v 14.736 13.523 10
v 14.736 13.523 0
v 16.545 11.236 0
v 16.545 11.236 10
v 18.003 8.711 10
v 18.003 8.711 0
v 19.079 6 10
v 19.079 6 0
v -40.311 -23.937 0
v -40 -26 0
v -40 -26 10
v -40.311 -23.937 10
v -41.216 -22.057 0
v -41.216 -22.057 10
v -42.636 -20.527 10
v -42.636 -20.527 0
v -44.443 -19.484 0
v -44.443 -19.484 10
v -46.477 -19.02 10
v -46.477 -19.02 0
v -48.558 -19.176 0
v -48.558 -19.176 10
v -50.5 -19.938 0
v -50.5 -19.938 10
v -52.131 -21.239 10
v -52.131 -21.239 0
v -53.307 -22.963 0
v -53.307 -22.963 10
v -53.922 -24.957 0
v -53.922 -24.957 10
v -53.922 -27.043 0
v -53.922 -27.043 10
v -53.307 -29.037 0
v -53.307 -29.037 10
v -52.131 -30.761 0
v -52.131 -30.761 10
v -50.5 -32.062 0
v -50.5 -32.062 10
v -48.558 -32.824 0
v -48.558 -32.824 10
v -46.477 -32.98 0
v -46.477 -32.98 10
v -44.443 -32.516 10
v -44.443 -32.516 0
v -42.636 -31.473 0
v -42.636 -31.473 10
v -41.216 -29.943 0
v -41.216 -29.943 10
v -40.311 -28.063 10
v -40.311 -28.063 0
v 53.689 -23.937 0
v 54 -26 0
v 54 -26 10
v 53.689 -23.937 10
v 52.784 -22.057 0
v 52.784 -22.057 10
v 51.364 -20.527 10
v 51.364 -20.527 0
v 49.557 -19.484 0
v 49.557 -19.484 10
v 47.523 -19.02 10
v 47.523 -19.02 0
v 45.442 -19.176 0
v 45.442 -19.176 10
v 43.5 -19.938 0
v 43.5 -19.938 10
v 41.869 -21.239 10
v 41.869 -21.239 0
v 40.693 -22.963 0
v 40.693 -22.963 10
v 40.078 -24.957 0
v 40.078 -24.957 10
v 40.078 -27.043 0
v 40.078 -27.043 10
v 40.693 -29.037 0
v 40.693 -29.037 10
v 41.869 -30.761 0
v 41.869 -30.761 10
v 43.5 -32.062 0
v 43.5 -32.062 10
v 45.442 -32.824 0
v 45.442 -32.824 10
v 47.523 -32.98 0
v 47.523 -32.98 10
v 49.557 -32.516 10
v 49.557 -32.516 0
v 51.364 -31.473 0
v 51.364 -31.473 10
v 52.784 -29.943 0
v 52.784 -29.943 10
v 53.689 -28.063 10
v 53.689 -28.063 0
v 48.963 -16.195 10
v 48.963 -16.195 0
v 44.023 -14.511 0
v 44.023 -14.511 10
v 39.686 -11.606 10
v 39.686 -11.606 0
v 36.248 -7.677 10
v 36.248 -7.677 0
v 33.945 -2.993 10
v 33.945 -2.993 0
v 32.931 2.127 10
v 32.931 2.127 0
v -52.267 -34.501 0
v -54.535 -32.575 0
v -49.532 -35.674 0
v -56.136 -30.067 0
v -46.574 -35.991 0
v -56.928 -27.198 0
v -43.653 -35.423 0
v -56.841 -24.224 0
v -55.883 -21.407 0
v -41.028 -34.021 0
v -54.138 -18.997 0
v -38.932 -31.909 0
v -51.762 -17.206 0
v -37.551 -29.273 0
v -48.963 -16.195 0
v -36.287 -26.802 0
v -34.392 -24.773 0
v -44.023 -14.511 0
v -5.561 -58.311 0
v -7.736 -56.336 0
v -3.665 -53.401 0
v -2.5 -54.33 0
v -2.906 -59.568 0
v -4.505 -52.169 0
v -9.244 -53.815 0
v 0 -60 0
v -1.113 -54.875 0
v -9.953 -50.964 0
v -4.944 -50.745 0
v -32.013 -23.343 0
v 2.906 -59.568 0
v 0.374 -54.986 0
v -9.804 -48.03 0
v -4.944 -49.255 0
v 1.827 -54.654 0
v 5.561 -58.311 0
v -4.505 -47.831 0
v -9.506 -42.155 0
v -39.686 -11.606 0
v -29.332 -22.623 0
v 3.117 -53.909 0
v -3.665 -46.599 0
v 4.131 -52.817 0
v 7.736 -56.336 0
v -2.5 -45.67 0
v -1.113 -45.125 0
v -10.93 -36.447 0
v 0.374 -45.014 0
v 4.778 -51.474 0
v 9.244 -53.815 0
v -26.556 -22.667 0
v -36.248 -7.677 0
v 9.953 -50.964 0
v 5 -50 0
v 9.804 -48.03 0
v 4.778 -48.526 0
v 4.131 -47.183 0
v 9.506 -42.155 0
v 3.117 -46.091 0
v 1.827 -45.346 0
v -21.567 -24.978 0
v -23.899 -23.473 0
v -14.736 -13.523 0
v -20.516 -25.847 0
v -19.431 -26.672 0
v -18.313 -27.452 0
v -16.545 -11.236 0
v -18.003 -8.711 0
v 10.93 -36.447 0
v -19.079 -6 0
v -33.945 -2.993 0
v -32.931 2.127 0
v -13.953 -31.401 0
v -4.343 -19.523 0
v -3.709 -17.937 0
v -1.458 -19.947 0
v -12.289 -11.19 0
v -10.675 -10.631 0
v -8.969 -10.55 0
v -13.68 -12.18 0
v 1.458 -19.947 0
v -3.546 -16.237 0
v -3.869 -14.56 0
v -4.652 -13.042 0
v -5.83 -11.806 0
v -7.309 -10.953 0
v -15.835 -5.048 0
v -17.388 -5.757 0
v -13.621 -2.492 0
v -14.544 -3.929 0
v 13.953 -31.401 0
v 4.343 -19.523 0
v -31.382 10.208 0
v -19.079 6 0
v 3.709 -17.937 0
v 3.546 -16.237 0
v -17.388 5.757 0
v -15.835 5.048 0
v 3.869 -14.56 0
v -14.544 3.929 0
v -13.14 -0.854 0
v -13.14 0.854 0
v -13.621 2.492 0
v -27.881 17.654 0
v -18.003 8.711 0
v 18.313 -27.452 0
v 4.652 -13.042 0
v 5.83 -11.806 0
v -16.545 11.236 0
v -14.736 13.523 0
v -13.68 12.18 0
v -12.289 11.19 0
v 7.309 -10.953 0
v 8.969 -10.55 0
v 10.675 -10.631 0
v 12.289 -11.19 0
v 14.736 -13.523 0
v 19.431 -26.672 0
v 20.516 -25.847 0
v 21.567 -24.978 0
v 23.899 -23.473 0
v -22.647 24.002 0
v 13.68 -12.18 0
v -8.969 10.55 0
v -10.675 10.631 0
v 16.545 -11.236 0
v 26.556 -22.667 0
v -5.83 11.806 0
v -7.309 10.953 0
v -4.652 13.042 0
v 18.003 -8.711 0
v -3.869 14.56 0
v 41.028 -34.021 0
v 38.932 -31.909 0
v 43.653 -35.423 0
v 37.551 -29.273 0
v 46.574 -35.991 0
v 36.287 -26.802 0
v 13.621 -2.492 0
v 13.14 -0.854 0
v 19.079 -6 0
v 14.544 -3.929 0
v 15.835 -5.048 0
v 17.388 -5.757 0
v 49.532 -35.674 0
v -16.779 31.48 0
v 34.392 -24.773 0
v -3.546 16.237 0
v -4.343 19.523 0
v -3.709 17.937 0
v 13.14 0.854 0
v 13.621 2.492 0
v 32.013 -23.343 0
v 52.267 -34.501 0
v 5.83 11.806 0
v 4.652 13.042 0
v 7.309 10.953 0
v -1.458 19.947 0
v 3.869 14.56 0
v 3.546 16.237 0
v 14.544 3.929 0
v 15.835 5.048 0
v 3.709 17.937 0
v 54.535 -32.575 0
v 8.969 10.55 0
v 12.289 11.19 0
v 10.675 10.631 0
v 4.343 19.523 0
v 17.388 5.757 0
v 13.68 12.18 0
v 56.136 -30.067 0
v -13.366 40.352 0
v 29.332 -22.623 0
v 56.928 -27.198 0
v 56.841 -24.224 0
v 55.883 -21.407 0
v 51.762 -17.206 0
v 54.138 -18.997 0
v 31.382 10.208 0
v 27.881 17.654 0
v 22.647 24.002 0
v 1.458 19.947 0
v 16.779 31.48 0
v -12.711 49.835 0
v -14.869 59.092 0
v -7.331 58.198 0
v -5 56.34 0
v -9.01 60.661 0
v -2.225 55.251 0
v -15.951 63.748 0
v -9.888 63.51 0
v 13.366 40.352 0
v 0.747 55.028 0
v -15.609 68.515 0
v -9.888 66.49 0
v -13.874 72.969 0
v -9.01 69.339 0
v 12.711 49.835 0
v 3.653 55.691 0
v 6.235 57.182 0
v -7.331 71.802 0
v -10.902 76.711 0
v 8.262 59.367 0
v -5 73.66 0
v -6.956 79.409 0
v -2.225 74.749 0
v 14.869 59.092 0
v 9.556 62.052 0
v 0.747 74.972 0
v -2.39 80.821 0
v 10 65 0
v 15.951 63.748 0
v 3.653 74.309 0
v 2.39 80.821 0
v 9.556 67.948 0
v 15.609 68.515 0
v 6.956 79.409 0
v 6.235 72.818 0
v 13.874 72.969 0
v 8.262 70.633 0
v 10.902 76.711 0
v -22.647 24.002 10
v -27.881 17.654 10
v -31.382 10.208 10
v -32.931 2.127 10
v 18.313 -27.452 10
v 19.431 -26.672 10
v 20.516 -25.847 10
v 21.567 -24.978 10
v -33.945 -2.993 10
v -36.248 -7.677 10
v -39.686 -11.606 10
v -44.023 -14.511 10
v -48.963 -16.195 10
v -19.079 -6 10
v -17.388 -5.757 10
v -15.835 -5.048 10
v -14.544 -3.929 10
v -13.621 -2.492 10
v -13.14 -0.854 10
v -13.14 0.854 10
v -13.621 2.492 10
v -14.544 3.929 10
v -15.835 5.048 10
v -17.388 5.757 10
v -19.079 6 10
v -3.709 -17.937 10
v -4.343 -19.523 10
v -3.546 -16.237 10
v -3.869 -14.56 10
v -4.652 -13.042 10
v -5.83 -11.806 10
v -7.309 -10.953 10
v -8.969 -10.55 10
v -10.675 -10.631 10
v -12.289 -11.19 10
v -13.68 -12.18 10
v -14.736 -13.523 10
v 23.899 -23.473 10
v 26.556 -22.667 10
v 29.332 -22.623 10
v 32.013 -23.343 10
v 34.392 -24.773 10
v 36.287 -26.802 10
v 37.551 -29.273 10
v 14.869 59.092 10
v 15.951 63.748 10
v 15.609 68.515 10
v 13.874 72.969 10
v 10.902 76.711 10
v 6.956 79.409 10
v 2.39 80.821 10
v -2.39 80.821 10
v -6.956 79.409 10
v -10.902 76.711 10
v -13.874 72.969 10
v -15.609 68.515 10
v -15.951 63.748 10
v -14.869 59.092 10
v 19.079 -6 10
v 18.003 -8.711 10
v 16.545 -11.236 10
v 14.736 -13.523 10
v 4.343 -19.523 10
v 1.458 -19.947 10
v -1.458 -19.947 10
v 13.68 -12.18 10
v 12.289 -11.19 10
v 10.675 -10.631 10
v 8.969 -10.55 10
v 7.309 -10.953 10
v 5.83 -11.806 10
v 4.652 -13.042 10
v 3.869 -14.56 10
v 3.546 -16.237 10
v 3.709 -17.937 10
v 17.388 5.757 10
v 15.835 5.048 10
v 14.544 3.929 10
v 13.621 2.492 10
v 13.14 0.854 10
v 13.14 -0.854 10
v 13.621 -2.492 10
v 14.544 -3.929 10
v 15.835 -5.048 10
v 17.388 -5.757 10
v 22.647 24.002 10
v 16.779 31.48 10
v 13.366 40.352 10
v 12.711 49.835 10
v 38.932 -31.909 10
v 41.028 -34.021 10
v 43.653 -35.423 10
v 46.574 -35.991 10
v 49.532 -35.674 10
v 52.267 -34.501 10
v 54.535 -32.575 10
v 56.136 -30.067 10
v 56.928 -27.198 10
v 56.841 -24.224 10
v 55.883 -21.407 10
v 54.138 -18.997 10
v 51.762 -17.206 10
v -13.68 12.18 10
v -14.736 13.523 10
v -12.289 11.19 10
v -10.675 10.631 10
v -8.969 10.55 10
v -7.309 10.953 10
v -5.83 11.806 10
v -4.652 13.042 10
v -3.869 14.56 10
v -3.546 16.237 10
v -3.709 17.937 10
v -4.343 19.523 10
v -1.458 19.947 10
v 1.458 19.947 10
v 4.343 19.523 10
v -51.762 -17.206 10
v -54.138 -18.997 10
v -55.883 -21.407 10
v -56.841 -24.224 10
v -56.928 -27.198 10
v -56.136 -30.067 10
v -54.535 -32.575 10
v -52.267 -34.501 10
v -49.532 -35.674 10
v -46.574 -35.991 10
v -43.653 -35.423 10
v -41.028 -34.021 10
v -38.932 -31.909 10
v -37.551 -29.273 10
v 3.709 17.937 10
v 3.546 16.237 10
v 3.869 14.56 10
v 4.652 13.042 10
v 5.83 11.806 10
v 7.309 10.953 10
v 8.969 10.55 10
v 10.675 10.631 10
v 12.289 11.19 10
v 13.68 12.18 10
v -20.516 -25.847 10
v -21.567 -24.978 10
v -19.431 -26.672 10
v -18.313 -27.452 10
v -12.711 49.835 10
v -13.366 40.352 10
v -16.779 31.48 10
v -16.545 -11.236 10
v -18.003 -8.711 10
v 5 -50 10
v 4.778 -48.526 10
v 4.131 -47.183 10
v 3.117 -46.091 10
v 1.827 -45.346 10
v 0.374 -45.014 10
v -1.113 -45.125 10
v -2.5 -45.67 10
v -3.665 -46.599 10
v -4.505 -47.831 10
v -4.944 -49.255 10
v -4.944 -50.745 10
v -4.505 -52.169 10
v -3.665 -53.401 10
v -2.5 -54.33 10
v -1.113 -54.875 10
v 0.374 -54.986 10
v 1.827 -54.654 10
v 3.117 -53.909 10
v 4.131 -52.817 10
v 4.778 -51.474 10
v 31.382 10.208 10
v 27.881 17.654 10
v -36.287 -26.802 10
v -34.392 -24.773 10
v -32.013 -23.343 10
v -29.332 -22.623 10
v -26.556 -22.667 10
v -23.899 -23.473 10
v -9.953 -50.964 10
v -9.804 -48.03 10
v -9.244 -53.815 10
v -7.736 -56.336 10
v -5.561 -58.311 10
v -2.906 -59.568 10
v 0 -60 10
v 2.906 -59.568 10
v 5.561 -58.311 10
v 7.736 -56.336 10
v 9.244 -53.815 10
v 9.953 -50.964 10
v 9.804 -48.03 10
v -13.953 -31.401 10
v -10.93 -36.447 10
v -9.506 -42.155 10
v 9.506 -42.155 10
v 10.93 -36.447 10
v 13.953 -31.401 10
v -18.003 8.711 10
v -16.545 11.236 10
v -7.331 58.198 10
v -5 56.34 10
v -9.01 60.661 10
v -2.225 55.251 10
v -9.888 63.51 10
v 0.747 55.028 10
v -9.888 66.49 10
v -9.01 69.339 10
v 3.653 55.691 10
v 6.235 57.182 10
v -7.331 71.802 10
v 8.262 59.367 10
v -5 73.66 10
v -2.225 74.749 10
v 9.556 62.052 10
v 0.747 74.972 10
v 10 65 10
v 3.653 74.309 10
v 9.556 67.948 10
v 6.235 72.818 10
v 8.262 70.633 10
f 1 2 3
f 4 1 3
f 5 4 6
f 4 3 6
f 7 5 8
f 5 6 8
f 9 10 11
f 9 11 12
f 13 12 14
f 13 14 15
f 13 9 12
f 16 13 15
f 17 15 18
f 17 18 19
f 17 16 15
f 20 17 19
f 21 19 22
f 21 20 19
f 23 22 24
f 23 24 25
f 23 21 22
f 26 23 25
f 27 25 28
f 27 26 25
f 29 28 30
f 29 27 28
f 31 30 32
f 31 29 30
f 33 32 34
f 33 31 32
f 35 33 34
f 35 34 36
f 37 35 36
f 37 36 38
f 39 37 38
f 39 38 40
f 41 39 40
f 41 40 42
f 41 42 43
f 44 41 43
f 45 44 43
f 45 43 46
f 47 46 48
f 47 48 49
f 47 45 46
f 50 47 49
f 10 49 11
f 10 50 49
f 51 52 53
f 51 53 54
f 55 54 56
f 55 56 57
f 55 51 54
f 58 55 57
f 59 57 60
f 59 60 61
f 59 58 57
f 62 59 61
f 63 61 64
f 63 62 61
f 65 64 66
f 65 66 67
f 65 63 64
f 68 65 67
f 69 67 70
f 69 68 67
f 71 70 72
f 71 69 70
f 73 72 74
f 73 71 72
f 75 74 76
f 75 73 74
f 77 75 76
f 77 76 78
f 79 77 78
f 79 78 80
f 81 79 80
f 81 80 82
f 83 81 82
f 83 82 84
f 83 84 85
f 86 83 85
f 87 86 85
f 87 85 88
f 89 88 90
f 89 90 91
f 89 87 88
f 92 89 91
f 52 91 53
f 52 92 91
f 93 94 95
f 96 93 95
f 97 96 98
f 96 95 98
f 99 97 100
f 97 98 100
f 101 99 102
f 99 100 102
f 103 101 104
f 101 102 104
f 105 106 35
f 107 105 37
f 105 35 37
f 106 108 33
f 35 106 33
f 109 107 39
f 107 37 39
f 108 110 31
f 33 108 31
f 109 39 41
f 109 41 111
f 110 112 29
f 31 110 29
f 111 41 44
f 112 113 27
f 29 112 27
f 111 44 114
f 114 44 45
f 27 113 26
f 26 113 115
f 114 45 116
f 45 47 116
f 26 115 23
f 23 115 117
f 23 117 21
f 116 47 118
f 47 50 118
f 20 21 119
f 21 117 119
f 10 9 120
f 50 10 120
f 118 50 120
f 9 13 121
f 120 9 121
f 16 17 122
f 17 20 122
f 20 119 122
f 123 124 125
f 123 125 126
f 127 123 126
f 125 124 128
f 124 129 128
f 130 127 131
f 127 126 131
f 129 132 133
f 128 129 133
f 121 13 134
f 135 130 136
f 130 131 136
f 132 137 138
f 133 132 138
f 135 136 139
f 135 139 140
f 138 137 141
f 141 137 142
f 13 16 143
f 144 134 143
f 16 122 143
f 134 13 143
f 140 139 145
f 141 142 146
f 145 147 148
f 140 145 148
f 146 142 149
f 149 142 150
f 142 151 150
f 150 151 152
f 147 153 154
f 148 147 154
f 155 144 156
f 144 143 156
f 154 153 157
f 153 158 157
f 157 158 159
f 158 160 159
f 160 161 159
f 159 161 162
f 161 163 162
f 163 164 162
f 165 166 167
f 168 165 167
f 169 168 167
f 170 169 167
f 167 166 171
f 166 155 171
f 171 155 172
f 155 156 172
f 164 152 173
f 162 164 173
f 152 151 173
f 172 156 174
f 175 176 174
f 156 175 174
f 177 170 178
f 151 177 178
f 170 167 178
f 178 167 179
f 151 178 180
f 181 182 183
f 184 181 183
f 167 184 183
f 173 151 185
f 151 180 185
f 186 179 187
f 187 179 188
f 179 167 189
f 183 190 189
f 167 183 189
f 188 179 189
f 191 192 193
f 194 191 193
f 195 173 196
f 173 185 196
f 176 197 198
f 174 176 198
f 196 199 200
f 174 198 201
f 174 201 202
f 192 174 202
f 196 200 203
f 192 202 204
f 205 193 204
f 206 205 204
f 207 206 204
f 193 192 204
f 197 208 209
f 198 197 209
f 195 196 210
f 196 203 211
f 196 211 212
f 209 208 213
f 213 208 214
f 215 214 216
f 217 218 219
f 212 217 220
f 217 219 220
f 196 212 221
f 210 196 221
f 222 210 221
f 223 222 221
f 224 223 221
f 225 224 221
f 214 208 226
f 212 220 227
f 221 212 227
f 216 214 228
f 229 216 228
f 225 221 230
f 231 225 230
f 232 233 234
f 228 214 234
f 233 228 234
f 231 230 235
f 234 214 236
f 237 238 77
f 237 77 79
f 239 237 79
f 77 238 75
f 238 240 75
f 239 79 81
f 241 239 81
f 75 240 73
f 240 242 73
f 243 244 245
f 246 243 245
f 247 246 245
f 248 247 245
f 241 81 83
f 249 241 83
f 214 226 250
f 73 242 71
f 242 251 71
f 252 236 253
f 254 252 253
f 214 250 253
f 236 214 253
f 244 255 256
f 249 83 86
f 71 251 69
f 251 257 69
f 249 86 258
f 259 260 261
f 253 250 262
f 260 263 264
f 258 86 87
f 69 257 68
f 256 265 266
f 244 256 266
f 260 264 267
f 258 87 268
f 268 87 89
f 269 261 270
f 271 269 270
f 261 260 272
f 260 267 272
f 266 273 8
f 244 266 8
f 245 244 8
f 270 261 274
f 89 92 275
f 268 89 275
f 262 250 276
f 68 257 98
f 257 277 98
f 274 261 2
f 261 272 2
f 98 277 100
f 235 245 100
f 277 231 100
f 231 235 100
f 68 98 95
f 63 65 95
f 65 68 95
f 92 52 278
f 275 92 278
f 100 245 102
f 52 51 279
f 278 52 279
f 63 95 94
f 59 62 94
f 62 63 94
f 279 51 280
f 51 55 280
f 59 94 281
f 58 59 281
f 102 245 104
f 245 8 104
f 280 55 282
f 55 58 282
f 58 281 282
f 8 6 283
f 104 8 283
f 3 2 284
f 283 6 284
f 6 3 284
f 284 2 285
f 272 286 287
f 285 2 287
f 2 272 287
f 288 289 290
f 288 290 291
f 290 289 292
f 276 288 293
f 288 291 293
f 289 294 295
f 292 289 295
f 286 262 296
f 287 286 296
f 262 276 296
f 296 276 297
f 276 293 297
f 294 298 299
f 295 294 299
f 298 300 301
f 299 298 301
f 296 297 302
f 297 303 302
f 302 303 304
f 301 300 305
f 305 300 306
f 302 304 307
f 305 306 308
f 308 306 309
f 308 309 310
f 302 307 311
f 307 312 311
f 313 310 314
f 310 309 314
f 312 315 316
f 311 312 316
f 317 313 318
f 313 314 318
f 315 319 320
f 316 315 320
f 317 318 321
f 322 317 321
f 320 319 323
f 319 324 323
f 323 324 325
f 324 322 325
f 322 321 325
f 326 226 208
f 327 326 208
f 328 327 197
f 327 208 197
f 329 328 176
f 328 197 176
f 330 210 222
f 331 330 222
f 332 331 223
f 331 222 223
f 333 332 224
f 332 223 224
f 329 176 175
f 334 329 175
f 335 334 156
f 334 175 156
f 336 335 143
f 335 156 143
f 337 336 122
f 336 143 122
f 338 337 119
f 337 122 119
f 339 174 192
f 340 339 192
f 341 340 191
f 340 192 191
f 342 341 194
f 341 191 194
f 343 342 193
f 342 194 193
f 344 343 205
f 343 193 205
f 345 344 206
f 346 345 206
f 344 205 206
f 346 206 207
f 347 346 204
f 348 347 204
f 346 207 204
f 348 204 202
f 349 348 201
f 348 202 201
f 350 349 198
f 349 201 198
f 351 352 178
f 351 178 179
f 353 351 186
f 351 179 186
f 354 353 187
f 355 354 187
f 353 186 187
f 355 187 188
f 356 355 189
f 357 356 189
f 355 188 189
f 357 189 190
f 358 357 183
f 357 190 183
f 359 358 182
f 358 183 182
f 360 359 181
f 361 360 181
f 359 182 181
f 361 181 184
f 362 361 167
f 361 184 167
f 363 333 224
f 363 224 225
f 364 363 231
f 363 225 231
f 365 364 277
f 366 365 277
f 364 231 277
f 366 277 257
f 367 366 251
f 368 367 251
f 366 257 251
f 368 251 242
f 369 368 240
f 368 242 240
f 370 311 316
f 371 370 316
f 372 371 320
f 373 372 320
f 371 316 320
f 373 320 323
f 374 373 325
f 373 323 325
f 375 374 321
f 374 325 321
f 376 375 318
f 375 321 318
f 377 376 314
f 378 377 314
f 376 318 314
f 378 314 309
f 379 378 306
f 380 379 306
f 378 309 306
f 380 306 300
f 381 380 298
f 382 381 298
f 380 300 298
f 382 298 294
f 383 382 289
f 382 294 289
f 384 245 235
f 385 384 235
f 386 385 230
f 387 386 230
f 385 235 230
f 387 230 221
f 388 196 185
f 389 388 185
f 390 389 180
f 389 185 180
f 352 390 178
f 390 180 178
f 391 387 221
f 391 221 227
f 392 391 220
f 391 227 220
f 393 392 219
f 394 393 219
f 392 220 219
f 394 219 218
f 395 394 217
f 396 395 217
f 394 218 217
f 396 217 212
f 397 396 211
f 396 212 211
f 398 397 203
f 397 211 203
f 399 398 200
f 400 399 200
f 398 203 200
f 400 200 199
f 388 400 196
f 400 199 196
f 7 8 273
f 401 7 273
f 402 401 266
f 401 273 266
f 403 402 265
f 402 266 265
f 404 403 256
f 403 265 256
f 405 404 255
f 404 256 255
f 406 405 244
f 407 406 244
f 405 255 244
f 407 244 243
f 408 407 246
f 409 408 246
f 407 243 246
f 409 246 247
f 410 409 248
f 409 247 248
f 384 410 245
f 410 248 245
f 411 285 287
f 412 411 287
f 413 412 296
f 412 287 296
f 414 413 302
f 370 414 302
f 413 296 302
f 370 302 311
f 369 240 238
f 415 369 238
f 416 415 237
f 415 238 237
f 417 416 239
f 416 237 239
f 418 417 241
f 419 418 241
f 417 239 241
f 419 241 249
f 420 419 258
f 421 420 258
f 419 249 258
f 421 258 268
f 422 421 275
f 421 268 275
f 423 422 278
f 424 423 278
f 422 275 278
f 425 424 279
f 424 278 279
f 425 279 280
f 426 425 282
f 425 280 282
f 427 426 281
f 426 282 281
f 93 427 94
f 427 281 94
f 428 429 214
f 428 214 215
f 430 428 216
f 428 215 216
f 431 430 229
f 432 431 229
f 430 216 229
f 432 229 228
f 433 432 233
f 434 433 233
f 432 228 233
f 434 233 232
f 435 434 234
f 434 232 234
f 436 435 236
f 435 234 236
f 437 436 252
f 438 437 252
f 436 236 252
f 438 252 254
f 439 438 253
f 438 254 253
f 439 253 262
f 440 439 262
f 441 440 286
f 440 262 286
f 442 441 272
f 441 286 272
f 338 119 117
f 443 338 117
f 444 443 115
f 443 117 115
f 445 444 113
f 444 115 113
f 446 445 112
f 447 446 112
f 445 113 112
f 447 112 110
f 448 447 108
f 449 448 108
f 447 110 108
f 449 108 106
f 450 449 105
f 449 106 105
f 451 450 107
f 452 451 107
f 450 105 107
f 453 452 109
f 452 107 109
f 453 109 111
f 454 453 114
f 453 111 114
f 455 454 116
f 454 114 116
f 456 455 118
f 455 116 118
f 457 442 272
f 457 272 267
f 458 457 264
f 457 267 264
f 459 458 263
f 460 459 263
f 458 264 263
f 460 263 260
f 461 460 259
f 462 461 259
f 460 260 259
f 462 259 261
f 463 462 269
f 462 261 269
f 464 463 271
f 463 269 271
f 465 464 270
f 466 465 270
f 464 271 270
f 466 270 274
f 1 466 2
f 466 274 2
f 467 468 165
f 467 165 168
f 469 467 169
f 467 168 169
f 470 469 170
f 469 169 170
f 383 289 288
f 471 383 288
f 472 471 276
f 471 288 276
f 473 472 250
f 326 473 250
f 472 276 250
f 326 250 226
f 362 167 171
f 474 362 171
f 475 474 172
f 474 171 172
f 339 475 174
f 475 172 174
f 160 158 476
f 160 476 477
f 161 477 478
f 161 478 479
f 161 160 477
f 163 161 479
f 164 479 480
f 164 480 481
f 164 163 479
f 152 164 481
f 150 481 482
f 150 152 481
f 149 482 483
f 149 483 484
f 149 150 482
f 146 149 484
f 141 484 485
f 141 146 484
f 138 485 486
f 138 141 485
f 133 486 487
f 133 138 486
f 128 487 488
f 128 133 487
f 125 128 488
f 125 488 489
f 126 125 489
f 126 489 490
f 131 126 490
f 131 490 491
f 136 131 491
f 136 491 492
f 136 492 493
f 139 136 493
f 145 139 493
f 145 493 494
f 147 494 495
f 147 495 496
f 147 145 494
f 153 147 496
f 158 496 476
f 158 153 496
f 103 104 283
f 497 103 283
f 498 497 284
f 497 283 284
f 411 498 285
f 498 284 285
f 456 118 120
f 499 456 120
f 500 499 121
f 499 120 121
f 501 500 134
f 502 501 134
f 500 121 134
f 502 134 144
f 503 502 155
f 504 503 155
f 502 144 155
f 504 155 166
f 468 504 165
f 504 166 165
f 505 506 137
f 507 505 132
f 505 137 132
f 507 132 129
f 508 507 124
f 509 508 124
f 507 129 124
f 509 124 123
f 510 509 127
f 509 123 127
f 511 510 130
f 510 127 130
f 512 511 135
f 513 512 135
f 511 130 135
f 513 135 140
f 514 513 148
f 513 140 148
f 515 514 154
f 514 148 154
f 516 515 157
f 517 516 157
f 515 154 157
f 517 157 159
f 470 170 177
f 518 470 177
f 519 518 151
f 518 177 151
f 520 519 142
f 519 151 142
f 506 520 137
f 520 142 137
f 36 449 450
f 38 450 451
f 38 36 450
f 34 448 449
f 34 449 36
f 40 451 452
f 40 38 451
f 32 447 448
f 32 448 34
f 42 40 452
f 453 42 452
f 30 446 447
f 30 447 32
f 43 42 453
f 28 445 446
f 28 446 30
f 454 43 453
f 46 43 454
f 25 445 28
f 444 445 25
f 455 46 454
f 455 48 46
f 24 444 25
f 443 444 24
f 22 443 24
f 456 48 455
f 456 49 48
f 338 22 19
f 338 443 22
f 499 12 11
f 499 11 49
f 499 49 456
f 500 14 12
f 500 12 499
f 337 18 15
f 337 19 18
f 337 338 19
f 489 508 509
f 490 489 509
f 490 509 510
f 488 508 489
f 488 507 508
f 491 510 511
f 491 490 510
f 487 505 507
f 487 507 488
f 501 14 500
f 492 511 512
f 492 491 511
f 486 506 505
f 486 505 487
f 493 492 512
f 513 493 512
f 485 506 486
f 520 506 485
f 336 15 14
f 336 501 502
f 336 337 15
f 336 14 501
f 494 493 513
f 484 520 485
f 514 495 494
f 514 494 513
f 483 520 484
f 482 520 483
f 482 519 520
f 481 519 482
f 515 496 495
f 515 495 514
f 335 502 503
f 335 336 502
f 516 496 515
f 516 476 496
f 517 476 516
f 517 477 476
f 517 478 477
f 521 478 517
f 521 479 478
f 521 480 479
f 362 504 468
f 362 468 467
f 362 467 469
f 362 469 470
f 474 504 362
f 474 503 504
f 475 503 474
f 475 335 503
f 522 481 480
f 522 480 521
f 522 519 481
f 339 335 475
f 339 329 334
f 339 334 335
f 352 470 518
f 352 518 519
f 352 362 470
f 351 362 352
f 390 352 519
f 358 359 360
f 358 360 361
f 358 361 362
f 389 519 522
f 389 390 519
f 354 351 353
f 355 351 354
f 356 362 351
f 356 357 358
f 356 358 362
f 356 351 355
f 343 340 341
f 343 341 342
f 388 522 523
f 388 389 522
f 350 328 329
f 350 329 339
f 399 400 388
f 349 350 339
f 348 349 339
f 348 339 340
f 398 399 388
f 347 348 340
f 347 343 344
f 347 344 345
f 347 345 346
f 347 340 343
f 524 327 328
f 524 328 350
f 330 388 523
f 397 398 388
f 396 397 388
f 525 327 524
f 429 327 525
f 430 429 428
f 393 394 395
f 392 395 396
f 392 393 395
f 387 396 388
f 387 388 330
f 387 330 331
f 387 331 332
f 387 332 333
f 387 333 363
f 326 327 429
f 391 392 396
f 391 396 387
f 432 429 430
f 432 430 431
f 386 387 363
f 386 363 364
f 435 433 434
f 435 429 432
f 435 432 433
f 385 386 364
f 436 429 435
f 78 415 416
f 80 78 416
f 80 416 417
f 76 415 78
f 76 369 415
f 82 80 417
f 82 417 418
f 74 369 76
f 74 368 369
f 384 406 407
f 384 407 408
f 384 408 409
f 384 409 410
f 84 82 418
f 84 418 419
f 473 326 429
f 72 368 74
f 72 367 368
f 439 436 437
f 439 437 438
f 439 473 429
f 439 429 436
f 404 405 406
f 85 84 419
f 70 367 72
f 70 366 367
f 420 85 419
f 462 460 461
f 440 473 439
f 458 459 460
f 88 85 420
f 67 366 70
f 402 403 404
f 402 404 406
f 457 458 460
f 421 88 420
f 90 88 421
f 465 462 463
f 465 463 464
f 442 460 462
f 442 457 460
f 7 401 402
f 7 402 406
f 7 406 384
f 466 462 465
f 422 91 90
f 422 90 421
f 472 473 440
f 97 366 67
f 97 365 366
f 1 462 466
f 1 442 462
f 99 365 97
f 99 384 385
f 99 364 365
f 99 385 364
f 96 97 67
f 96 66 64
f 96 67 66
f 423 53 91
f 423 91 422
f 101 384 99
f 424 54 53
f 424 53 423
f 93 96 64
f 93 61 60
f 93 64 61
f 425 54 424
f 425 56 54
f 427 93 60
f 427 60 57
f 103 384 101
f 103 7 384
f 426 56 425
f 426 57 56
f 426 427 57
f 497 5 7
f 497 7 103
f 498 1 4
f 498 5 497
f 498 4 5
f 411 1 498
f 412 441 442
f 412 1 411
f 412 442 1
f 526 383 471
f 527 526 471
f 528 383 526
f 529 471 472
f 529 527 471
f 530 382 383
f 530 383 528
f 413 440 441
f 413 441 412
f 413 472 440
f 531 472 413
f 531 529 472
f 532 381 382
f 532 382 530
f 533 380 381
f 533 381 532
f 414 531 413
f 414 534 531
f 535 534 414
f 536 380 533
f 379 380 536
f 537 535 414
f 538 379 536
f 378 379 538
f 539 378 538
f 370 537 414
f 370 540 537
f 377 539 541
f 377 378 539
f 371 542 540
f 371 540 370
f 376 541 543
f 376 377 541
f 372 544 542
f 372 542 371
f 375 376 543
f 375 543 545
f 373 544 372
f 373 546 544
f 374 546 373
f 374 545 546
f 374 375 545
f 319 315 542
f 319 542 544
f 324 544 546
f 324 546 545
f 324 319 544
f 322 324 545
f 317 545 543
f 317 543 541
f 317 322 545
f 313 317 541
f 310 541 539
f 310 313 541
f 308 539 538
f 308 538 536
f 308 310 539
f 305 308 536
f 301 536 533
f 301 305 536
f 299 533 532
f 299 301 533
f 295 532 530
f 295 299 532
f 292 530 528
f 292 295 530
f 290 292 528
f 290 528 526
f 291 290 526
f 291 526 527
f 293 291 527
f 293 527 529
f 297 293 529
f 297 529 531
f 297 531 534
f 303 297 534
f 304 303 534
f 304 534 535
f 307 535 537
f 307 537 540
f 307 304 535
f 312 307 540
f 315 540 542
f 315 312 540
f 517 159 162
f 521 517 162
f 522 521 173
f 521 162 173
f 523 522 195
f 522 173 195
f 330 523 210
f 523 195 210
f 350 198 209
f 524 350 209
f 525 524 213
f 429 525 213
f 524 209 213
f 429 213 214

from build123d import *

# Parameters (mm, degrees)
SKETCH1_R           = 7
SKETCH1_R_2         = 5
SKETCH1_R_3         = 10
BOSS_EXTRUDE1_DEPTH = 10


with BuildPart() as part:
    # Sketch1 → Boss-Extrude1 (new body)
    with BuildSketch(Plane.XY):
        with BuildLine():
            ThreePointArc((-14.869403875, 59.092307692), (-13.366464174, 40.352096999), (-22.647245902, 24.002130178))
            ThreePointArc((-22.647245902, 24.002130178), (-29.864288772, 14.040094593), (-32.931378534, 2.127042038))
            ThreePointArc((-32.931378534, 2.127042038), (-37.838433301, -9.754136505), (-48.963263256, -16.194613858))
            ThreePointArc((-48.963263256, -16.194613858), (-54.534765397, -32.574747935), (-37.550915036, -29.273345896))
            ThreePointArc((-37.550915036, -29.273345896), (-30.697148757, -22.889346352), (-21.566520754, -24.9776937))
            ThreePointArc((-21.566520754, -24.9776937), (-19.978209416, -26.265398313), (-18.313197236, -27.452264151))
            ThreePointArc((-18.313197236, -27.452264151), (-10.929939867, -36.447383635), (-9.804034884, -48.03))
            ThreePointArc((-9.804034884, -48.03), (0, -60), (9.804034884, -48.03))
            ThreePointArc((9.804034884, -48.03), (10.929939867, -36.447383635), (18.313197236, -27.452264151))
            ThreePointArc((18.313197236, -27.452264151), (19.978209416, -26.265398313), (21.566520754, -24.9776937))
            ThreePointArc((21.566520754, -24.9776937), (30.697148757, -22.889346352), (37.550915036, -29.273345896))
            ThreePointArc((37.550915036, -29.273345896), (54.534765397, -32.574747935), (48.963263256, -16.194613858))
            ThreePointArc((48.963263256, -16.194613858), (37.838433301, -9.754136505), (32.931378534, 2.127042038))
            ThreePointArc((32.931378534, 2.127042038), (29.864288772, 14.040094593), (22.647245902, 24.002130178))
            ThreePointArc((22.647245902, 24.002130178), (13.366464174, 40.352096999), (14.869403875, 59.092307692))
            ThreePointArc((14.869403875, 59.092307692), (0, 81), (-14.869403875, 59.092307692))
        make_face()
        with Locations((-47, -26)):
            Circle(SKETCH1_R, mode=Mode.SUBTRACT)
        with Locations((0, -50)):
            Circle(SKETCH1_R_2, mode=Mode.SUBTRACT)
        with Locations((47, -26)):
            Circle(SKETCH1_R, mode=Mode.SUBTRACT)
        with BuildLine():
            ThreePointArc((-14.735544437, -13.522711642), (-17.320508076, -10), (-19.078784028, -6))
            ThreePointArc((-19.078784028, -6), (-13.078784028, 0), (-19.078784028, 6))
            ThreePointArc((-19.078784028, 6), (-17.320508076, 10), (-14.735544437, 13.522711642))
            ThreePointArc((-14.735544437, 13.522711642), (-6.539392014, 11.326559219), (-4.343239591, 19.522711642))
            ThreePointArc((-4.343239591, 19.522711642), (0, 20), (4.343239591, 19.522711642))
            ThreePointArc((4.343239591, 19.522711642), (6.539392014, 11.326559219), (14.735544437, 13.522711642))
            ThreePointArc((14.735544437, 13.522711642), (17.320508076, 10), (19.078784028, 6))
            ThreePointArc((19.078784028, 6), (13.078784028, 0), (19.078784028, -6))
            ThreePointArc((19.078784028, -6), (17.320508076, -10), (14.735544437, -13.522711642))
            ThreePointArc((14.735544437, -13.522711642), (6.539392014, -11.326559219), (4.343239591, -19.522711642))
            ThreePointArc((4.343239591, -19.522711642), (0, -20), (-4.343239591, -19.522711642))
            ThreePointArc((-4.343239591, -19.522711642), (-6.539392014, -11.326559219), (-14.735544437, -13.522711642))
        make_face(mode=Mode.SUBTRACT)
        with Locations((0, 65)):
            Circle(SKETCH1_R_3, mode=Mode.SUBTRACT)
    extrude(amount=BOSS_EXTRUDE1_DEPTH)


solid = part.part
